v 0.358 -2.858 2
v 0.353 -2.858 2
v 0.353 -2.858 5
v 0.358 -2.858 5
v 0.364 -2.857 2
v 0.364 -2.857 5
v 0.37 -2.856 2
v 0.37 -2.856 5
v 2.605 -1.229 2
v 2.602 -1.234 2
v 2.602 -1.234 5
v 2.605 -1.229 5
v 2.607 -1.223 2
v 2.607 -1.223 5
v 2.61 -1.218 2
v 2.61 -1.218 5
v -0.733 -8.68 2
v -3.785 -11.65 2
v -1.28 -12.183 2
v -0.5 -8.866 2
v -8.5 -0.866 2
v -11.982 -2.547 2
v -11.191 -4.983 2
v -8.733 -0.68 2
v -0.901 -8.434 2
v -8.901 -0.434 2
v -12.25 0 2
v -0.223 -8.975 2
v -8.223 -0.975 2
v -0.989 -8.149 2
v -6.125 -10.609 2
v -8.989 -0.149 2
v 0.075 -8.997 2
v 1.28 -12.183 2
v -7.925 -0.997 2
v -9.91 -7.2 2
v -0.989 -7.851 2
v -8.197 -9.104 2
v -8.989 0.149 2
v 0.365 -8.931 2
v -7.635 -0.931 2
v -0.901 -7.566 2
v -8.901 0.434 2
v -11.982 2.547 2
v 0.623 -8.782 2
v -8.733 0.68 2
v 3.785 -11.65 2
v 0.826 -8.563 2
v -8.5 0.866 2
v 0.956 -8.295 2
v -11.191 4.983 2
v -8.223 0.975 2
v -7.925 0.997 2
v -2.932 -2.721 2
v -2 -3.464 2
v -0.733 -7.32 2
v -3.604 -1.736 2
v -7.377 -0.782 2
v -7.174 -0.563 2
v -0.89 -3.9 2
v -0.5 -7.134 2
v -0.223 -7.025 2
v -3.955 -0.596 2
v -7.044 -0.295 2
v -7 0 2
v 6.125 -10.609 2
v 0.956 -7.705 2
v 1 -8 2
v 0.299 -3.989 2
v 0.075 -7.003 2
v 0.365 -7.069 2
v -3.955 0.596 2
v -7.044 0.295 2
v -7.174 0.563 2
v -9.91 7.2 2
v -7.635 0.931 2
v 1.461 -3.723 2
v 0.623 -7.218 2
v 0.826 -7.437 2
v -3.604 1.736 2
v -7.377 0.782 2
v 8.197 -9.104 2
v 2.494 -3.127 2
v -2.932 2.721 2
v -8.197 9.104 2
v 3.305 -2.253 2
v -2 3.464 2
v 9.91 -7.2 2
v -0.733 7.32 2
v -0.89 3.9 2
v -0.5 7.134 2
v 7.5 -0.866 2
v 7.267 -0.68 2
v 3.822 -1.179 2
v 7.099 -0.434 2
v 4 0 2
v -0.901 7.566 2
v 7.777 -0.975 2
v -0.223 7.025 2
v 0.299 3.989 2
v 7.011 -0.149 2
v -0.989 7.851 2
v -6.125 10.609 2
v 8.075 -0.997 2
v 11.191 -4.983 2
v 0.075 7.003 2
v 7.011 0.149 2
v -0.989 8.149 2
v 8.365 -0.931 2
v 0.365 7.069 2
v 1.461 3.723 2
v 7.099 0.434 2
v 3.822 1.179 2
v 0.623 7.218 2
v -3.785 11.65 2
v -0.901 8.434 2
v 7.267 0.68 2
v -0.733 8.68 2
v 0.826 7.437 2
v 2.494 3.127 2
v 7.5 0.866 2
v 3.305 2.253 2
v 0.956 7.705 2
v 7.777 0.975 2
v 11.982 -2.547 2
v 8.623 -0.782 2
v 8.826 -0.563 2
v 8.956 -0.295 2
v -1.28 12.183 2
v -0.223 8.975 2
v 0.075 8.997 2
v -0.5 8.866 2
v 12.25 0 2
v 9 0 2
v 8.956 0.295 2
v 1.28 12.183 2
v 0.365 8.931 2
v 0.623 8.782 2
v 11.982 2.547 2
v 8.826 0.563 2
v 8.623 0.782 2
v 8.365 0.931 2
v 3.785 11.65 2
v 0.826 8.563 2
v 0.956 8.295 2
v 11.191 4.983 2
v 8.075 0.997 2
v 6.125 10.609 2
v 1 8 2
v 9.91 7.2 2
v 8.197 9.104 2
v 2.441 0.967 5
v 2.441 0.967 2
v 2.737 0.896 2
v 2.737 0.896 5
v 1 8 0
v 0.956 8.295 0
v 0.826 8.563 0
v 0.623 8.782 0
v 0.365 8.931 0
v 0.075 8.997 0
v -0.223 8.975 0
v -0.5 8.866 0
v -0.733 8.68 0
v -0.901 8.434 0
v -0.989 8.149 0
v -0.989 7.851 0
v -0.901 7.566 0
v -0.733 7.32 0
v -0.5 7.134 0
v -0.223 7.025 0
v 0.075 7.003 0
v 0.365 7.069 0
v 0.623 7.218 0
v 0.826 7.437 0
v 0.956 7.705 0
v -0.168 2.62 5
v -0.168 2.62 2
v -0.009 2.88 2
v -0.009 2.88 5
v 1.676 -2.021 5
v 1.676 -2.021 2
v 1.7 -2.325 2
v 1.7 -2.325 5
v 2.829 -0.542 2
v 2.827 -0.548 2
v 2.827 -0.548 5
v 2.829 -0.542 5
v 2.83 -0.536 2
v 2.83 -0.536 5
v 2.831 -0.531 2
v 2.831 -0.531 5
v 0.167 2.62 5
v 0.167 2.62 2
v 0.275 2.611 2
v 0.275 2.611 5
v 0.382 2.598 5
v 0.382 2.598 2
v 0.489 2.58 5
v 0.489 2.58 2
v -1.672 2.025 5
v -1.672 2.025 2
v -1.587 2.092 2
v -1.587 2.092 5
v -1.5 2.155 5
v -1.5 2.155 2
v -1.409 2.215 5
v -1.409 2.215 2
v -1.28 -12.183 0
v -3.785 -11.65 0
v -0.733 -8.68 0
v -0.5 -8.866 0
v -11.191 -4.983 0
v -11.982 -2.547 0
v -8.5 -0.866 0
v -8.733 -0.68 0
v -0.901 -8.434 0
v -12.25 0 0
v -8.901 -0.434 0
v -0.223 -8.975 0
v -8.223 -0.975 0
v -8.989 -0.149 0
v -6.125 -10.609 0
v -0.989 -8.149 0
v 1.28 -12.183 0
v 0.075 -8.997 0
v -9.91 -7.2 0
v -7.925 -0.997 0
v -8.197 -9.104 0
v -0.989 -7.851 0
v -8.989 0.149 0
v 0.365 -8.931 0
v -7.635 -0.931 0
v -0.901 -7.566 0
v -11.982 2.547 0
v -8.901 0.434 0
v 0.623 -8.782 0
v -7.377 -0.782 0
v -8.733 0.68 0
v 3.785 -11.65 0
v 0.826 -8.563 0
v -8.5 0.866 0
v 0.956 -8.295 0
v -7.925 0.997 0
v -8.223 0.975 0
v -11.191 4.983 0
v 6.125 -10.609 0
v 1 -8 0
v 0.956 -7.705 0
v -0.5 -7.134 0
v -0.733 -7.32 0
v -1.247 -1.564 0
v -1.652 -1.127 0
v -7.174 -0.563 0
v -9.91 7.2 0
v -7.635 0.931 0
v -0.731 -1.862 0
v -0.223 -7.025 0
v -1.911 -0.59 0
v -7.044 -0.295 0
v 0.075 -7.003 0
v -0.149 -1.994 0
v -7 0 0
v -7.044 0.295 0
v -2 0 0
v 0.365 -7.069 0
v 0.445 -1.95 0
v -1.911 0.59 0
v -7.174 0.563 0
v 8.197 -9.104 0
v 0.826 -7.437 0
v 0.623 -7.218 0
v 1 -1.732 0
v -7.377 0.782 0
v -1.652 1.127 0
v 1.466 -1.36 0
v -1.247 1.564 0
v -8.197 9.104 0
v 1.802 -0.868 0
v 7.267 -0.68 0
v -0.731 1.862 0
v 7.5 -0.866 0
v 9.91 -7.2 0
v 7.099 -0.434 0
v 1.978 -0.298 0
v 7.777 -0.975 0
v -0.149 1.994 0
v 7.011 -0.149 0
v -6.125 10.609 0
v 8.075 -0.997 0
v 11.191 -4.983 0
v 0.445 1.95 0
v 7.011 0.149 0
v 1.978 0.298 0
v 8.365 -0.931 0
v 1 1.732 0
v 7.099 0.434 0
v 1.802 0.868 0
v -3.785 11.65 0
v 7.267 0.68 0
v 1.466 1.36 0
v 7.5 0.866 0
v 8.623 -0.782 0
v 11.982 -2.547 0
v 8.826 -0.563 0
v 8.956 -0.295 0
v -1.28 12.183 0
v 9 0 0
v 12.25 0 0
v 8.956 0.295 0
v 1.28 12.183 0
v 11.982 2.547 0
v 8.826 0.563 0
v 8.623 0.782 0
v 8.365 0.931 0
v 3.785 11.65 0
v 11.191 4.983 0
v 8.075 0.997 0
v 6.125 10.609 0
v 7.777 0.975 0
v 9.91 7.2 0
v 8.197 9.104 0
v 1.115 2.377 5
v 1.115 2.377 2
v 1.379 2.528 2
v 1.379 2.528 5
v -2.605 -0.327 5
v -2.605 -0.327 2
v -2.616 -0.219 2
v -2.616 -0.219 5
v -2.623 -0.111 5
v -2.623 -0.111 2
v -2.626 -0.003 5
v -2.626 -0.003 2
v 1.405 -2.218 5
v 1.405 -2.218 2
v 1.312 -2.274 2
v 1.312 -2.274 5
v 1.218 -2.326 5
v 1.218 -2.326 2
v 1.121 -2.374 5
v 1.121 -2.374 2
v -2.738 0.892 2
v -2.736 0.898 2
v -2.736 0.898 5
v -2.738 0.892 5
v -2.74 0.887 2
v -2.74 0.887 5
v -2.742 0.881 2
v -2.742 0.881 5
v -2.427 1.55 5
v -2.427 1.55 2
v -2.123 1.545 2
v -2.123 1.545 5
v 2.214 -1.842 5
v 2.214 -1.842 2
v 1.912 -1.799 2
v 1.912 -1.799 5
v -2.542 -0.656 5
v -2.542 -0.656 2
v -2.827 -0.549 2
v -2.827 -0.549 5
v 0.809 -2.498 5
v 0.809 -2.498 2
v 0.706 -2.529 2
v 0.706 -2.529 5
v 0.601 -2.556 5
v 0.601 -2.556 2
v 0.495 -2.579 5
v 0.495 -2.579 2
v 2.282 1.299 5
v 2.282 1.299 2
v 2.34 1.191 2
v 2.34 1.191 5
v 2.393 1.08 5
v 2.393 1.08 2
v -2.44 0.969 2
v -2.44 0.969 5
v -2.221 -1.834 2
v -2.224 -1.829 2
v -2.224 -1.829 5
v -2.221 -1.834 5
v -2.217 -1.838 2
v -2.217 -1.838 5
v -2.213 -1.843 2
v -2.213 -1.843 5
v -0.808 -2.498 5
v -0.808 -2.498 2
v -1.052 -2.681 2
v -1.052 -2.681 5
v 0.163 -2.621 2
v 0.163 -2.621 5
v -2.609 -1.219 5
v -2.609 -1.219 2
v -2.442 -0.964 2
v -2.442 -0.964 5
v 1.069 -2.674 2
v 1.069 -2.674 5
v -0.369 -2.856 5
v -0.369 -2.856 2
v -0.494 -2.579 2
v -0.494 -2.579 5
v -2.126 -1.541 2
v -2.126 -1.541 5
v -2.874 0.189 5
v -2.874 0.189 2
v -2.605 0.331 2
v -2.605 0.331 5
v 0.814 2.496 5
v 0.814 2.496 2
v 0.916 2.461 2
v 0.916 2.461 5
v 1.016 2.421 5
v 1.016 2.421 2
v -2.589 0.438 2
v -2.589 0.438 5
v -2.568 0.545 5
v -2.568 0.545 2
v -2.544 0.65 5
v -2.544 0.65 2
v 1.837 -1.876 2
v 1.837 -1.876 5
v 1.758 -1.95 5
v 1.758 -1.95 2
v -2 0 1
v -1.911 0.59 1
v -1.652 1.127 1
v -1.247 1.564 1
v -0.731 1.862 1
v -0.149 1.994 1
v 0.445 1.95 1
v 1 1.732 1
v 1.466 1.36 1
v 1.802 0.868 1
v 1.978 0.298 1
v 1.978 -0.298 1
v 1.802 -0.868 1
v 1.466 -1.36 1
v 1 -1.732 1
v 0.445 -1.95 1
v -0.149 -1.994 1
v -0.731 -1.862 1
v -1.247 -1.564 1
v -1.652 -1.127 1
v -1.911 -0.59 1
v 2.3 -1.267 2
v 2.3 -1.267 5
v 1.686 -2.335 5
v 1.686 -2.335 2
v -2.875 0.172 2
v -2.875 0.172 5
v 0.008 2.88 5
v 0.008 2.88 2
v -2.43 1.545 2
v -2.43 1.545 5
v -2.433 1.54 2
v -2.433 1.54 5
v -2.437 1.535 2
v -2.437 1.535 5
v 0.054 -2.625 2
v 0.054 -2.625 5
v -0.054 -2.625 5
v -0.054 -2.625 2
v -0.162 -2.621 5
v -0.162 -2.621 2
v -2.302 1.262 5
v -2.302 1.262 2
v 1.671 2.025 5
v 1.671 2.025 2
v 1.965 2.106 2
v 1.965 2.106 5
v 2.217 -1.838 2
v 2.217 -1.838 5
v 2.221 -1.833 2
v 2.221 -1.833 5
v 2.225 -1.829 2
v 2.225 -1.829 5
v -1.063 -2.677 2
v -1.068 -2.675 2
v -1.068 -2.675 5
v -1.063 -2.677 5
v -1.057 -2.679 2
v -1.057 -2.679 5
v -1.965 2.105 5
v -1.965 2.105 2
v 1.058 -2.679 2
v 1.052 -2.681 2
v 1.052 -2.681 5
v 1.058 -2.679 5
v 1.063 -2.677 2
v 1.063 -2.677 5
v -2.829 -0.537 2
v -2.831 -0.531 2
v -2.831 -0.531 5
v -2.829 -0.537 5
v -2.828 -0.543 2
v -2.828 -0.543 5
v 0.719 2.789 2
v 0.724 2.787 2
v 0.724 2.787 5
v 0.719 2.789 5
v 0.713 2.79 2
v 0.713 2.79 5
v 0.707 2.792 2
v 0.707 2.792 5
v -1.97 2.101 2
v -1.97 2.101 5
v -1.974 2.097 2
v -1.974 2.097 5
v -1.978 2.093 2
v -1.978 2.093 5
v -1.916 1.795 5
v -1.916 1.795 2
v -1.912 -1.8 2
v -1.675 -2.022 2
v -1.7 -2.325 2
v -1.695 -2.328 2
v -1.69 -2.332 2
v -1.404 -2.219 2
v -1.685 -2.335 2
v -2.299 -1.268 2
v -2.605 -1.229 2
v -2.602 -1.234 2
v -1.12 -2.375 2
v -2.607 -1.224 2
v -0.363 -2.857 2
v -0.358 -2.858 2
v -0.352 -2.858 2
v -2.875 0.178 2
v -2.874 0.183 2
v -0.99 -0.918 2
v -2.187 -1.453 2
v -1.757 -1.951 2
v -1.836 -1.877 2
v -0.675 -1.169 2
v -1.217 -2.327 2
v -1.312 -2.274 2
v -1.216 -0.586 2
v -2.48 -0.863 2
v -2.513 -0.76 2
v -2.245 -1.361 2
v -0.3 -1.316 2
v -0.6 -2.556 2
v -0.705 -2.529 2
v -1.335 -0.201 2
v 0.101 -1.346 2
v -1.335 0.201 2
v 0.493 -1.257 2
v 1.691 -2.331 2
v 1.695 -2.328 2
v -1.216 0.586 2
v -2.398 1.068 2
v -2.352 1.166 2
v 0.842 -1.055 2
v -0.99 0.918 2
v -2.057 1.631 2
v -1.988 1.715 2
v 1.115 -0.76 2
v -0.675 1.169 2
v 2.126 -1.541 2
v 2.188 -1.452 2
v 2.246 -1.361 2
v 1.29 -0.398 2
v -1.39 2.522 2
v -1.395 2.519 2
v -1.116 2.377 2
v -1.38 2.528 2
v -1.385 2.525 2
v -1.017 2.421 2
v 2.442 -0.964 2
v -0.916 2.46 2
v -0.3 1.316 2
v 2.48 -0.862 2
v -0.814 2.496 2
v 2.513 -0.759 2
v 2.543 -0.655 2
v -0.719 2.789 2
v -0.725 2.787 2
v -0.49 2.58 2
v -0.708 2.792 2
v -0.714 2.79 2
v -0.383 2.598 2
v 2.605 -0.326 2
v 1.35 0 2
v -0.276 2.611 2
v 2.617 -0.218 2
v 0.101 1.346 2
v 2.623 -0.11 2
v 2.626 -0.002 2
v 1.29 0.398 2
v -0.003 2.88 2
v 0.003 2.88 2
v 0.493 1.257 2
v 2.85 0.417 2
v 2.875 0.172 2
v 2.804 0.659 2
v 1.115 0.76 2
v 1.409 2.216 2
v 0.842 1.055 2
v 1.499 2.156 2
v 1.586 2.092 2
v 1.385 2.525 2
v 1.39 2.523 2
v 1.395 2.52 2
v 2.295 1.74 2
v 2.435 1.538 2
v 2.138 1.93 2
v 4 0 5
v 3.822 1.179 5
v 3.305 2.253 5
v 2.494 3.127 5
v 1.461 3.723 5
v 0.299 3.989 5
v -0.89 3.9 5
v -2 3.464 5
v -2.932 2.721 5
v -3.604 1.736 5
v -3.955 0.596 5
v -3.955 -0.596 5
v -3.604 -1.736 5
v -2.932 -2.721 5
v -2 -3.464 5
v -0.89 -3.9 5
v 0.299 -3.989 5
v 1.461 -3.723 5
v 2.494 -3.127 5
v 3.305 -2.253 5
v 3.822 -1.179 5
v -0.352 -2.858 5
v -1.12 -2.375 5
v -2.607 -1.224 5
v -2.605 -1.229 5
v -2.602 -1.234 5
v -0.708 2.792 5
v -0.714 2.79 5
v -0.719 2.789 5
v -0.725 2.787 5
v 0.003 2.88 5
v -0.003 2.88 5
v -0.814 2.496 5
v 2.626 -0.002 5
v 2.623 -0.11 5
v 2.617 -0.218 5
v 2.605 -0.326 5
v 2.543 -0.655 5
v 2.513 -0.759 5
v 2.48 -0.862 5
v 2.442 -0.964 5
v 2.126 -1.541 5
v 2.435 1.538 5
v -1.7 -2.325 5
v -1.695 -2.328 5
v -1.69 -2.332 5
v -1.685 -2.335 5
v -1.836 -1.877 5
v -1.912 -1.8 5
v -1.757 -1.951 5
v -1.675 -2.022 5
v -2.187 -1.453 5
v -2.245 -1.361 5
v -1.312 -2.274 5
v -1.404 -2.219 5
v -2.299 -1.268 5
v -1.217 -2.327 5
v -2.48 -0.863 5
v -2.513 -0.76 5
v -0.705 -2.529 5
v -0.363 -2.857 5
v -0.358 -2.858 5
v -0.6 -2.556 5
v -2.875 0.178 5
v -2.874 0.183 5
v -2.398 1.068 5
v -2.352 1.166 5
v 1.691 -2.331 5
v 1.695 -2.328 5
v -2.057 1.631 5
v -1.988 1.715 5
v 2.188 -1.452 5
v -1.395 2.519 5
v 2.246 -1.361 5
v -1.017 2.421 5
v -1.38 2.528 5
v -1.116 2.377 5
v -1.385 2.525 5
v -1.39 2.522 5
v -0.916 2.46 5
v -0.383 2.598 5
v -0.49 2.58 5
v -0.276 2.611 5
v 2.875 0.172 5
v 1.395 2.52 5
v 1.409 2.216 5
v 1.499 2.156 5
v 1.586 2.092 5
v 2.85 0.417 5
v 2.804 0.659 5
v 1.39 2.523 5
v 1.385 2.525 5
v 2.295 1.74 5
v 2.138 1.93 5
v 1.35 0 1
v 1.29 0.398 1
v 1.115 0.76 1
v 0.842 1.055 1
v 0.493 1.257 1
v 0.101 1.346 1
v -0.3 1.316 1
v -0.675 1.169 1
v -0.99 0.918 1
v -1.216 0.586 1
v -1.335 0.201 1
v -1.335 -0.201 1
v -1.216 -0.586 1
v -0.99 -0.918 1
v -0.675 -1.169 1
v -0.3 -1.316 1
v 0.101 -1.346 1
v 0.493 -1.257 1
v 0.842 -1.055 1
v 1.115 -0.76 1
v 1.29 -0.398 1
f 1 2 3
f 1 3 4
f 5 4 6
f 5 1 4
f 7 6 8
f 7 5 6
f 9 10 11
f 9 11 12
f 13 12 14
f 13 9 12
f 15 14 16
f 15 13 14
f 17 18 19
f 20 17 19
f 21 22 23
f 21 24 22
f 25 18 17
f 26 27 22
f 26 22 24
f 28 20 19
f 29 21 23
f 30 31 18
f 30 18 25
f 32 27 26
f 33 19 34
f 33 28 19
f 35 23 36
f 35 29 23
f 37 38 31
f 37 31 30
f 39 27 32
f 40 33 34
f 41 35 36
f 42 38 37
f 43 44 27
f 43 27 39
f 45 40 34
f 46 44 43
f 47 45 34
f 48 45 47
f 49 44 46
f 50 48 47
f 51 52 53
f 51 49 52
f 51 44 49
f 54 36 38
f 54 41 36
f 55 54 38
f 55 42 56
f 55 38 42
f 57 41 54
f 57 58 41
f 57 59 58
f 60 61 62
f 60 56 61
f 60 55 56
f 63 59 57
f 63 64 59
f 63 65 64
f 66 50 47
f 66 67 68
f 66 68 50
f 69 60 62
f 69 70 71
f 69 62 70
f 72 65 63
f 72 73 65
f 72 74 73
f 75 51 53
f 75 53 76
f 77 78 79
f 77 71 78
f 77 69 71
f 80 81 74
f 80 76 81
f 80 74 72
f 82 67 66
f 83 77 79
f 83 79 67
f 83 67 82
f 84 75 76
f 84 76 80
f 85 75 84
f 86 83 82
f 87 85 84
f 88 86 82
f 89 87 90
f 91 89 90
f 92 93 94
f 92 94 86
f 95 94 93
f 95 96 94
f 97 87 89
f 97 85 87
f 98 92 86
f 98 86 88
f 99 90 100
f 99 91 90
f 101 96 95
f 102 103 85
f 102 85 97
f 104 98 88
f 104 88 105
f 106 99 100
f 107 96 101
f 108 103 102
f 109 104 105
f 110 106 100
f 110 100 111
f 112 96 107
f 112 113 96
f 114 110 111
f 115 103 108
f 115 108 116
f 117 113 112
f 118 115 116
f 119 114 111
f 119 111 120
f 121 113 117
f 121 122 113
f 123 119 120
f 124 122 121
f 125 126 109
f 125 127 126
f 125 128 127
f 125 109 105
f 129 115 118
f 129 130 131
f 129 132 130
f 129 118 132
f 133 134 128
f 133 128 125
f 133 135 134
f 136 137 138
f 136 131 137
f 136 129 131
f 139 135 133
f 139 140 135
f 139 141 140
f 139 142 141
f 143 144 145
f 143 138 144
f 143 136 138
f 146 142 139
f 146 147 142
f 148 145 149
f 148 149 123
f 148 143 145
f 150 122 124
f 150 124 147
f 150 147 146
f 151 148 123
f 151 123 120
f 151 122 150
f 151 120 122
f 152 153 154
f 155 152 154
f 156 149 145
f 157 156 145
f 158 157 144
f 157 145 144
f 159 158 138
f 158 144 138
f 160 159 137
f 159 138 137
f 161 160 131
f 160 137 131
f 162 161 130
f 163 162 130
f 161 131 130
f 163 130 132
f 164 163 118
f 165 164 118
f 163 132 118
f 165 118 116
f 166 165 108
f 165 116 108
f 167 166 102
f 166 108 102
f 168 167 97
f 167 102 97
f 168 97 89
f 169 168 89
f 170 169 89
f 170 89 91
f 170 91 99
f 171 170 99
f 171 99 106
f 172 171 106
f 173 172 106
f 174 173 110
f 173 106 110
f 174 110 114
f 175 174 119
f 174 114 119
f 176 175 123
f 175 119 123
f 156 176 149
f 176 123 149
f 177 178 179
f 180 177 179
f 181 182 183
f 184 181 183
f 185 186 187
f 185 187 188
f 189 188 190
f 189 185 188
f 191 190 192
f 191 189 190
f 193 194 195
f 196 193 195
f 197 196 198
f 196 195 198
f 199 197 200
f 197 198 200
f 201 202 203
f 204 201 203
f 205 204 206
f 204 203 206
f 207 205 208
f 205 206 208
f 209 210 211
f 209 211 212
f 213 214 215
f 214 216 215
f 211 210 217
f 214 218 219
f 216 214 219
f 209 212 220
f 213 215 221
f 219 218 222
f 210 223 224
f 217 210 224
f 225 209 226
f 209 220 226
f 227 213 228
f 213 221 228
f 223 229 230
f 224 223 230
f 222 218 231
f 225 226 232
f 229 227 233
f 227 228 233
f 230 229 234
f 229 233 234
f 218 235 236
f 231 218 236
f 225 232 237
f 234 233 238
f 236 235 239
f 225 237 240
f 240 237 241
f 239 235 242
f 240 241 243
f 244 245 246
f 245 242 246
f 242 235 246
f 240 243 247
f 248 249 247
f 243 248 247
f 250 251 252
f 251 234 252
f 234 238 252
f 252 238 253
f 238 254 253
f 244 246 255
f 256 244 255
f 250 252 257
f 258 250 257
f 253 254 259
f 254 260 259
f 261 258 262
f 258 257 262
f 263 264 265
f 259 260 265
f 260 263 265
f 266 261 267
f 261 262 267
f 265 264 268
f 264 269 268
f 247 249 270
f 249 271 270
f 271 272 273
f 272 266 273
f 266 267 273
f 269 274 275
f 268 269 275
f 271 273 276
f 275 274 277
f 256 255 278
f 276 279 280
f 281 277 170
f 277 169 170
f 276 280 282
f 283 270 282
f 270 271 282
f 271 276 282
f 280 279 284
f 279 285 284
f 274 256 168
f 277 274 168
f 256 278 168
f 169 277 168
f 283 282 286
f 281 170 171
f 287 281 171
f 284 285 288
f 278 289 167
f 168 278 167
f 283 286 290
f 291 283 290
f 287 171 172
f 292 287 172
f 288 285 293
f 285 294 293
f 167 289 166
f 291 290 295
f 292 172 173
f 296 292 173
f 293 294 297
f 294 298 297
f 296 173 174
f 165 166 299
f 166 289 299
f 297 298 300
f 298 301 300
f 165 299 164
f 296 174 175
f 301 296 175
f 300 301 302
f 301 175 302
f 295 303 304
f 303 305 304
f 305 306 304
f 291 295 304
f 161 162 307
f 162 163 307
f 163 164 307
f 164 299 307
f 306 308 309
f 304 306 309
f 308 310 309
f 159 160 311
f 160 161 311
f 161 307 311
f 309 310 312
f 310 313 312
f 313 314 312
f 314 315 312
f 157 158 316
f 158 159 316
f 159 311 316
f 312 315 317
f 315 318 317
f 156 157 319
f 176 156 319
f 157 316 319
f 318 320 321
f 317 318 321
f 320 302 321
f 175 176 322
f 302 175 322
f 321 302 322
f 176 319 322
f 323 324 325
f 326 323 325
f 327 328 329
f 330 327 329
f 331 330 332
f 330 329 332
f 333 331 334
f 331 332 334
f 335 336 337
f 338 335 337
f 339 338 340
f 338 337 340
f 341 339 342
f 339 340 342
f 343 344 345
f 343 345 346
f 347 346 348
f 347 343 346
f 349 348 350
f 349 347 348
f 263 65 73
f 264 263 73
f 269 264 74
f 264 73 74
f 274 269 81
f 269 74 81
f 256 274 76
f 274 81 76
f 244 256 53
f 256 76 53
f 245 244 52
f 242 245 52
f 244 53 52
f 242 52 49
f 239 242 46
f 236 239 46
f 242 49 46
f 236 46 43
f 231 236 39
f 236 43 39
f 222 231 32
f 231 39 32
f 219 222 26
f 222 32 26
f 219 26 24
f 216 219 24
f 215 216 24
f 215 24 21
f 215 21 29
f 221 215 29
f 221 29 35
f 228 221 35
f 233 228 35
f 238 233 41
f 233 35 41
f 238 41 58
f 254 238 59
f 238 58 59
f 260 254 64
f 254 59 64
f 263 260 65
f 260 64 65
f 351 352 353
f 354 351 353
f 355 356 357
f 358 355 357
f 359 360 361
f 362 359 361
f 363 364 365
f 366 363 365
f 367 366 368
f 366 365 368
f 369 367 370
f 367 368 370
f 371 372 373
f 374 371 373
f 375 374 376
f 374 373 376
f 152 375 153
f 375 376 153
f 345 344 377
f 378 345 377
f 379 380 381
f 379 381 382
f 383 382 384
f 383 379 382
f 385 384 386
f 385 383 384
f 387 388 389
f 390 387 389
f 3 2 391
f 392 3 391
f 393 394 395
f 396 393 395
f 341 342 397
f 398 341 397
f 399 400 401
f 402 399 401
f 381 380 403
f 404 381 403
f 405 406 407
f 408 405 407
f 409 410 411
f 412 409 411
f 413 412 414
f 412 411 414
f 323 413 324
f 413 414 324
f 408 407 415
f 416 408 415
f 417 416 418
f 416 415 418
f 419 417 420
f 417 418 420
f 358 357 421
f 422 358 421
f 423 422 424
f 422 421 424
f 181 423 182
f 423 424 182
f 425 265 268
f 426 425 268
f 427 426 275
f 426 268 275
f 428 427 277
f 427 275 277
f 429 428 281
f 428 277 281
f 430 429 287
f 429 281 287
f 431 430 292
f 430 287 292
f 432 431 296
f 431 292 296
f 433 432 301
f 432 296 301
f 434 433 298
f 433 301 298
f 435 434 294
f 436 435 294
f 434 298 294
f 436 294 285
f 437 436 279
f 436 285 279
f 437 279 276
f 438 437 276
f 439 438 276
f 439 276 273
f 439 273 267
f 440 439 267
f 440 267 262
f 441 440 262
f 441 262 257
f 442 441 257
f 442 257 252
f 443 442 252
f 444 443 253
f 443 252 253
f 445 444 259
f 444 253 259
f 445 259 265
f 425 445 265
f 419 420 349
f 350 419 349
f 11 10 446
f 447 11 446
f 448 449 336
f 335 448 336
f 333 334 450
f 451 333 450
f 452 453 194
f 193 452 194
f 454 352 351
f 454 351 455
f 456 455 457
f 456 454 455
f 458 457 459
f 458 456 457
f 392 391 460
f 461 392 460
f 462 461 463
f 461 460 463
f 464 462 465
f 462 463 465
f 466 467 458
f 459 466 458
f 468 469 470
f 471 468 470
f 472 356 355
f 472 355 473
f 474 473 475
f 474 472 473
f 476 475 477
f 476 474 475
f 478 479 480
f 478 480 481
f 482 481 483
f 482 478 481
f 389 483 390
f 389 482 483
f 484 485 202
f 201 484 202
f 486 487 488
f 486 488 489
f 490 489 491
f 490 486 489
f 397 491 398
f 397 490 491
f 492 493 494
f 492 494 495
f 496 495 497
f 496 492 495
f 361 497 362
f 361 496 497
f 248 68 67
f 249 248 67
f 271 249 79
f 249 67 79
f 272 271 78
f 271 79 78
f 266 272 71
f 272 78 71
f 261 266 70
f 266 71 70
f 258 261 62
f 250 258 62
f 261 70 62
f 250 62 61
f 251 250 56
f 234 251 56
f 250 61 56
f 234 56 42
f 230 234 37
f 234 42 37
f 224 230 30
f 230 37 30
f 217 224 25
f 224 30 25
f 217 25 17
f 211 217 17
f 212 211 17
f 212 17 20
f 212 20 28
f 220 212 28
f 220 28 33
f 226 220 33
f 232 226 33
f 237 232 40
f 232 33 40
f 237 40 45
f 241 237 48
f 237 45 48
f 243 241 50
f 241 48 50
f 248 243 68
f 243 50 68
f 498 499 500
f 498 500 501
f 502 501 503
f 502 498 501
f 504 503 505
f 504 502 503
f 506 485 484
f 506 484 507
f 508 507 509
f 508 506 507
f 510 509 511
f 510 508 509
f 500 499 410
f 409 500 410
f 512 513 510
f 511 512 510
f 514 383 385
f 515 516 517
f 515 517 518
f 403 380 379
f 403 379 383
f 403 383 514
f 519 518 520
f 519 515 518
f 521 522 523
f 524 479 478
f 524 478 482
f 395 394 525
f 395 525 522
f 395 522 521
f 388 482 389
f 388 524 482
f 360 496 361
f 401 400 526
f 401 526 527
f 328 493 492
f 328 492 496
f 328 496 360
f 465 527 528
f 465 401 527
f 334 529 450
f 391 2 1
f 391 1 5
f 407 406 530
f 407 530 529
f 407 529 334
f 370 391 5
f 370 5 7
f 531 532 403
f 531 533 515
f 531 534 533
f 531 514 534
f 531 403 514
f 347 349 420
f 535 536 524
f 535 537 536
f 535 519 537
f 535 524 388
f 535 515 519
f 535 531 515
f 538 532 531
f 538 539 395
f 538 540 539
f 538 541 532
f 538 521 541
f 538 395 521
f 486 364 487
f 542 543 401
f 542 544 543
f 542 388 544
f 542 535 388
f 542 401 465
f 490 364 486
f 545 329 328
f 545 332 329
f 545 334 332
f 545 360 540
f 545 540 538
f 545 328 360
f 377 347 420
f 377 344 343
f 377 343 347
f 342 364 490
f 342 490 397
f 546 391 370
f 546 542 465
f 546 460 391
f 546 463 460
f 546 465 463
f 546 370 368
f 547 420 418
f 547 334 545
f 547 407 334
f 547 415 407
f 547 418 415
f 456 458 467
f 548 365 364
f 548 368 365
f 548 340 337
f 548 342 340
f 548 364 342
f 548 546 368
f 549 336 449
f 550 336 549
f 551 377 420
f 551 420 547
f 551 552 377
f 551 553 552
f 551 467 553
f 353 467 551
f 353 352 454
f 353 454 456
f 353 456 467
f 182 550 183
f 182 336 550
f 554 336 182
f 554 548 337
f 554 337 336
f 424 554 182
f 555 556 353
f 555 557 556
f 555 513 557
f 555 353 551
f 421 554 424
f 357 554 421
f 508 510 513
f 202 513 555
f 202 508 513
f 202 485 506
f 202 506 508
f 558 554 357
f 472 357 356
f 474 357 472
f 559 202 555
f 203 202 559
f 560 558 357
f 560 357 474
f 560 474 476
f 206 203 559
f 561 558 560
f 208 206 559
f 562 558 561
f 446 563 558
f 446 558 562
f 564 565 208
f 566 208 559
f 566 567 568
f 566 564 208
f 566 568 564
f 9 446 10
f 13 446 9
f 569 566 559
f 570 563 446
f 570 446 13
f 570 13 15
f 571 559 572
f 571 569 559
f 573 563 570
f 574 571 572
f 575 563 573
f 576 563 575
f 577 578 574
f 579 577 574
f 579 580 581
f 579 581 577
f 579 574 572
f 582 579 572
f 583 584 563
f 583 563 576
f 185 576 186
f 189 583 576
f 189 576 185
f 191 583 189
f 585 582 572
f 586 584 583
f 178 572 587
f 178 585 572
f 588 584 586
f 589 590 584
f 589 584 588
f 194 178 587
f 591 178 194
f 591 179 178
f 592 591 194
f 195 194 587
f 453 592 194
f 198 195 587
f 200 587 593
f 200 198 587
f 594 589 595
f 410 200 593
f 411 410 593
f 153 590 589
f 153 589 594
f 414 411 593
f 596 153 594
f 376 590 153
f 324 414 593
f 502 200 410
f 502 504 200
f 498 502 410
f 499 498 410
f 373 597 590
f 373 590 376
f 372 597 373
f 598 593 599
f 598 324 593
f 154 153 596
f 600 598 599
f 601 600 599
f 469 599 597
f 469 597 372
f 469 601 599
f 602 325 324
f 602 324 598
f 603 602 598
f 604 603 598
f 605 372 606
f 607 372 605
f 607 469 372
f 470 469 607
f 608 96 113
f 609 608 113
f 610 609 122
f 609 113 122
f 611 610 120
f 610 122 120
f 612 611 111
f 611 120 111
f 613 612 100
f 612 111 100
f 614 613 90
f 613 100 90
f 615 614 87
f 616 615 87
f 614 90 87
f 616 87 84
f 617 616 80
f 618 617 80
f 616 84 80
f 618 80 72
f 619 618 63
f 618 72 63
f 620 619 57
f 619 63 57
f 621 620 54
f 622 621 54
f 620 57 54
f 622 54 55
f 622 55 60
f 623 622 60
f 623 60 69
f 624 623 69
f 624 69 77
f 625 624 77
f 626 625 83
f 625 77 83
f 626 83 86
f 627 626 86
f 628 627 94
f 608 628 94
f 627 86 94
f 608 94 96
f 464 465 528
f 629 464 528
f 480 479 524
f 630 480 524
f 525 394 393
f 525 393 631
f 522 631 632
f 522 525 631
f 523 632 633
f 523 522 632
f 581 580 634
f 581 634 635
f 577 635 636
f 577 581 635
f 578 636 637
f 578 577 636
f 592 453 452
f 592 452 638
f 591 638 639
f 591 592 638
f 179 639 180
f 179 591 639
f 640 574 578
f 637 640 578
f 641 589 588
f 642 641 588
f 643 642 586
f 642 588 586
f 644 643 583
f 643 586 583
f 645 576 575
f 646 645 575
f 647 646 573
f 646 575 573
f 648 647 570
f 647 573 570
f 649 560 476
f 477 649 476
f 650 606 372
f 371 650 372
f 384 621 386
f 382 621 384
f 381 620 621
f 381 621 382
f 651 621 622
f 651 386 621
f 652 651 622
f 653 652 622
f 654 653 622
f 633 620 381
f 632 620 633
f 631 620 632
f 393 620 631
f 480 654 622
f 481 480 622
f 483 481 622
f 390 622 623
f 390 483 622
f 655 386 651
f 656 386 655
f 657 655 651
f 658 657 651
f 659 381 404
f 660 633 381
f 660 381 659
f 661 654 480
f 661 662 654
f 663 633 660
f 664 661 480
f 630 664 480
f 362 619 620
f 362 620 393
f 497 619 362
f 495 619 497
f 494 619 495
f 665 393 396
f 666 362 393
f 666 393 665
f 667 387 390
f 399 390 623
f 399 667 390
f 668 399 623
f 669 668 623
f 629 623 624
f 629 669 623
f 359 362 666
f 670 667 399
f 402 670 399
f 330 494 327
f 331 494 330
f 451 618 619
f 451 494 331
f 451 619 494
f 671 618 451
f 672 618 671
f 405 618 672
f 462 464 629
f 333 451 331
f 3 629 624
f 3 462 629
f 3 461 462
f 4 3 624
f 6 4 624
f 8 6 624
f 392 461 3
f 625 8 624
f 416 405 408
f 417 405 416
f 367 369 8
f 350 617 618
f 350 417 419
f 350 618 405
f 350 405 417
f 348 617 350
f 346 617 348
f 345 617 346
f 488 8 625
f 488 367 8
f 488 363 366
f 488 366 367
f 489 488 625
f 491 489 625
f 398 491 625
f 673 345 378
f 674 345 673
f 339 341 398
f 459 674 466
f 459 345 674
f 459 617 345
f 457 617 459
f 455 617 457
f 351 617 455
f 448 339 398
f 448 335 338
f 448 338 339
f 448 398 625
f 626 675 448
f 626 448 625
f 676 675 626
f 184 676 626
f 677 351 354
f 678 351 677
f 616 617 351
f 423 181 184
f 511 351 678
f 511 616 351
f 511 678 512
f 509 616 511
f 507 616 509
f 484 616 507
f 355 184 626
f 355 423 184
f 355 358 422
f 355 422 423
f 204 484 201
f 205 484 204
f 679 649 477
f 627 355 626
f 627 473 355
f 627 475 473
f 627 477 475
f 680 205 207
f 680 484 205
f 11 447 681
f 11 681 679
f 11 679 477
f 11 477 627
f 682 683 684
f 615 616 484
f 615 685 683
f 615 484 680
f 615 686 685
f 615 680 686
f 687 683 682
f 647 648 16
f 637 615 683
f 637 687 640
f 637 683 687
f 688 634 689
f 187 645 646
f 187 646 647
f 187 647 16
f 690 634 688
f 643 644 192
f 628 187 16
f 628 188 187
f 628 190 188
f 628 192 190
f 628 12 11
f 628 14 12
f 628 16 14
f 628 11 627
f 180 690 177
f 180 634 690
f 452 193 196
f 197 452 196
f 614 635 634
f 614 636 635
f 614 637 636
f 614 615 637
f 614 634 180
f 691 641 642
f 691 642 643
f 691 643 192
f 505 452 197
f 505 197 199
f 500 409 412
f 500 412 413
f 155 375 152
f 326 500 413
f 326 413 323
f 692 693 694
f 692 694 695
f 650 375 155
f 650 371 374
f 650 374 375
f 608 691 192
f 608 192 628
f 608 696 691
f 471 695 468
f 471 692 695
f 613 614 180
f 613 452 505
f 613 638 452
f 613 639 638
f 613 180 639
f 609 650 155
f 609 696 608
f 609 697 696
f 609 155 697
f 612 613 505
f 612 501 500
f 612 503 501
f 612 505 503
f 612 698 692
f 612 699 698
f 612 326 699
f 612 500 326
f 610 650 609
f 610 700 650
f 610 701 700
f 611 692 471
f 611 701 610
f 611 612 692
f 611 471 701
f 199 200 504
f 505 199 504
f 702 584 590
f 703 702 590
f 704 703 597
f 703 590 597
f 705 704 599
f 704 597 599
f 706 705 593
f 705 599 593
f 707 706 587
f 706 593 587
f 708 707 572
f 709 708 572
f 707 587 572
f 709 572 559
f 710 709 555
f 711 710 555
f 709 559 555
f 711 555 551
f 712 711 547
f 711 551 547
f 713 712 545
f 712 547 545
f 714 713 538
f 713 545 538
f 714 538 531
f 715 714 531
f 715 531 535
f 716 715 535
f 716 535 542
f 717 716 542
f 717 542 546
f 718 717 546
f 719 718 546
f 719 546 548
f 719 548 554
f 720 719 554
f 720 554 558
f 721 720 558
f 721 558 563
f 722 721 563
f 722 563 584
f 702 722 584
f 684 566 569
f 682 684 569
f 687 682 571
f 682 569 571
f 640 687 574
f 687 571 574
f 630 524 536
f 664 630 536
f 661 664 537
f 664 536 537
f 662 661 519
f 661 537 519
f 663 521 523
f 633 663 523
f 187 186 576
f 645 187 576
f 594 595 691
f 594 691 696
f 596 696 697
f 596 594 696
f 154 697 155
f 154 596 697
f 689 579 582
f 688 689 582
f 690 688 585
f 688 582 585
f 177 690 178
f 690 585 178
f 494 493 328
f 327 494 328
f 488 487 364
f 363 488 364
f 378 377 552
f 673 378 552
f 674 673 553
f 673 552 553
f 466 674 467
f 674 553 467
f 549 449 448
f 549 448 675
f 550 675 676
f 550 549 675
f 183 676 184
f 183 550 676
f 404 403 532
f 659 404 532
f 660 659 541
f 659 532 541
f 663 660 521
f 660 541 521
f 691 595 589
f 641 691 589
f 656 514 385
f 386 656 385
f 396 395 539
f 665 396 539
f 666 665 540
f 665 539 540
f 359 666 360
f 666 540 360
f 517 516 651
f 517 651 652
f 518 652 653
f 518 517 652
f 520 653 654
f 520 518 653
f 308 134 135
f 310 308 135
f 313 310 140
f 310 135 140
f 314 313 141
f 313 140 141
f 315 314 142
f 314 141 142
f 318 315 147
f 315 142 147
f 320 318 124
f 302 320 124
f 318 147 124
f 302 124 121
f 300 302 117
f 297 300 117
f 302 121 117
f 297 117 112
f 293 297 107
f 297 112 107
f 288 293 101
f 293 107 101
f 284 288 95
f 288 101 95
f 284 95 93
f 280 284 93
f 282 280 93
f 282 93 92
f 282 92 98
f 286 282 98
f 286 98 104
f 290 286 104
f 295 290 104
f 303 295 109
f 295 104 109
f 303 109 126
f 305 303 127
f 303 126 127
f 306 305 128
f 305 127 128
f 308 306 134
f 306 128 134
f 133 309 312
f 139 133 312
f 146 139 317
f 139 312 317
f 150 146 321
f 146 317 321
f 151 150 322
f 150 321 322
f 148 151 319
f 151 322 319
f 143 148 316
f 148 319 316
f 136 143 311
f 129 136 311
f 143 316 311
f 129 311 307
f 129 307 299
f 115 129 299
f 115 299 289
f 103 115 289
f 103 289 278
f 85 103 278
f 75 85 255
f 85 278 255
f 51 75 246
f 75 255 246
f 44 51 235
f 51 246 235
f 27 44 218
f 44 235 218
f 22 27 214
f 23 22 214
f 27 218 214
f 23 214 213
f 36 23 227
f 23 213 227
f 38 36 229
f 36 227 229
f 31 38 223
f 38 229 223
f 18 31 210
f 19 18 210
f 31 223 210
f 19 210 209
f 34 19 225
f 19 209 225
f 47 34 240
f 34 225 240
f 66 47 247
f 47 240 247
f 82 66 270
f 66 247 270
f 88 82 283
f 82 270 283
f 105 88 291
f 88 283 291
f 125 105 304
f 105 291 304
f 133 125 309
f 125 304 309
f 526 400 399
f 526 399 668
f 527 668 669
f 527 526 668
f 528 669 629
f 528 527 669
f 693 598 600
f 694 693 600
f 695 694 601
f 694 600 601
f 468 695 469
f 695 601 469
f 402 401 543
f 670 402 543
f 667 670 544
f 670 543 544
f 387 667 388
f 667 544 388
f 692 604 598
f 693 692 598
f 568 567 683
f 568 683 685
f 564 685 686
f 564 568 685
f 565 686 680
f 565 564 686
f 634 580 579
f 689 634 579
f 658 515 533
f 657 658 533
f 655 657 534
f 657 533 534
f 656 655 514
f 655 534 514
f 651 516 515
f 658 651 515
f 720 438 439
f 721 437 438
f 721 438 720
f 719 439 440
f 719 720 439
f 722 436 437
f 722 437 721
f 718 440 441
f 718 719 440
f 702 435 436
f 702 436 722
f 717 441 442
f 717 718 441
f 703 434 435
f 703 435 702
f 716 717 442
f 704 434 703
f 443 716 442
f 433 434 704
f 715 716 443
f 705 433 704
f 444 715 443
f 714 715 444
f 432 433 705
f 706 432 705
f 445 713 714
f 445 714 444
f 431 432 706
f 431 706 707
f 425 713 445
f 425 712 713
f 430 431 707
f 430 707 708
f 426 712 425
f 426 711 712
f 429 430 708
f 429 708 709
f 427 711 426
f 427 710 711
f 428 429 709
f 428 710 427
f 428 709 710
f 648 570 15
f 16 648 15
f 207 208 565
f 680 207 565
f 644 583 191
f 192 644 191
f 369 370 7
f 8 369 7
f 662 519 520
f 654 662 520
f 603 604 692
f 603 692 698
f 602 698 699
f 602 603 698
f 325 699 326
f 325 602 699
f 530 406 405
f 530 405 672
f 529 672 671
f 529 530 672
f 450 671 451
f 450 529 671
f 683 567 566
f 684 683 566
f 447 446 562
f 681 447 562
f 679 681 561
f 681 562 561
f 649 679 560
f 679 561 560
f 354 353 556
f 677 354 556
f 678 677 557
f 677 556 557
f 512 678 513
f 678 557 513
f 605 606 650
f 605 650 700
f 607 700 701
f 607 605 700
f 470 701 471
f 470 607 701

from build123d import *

# Parameters (mm, degrees)
SKETCH1_R           = 12.25
BOSS_EXTRUDE1_DEPTH = 2
SKETCH2_R           = 1
CUT_EXTRUDE1_DEPTH  = 2
SKETCH3_R           = 1.35
CUT_EXTRUDE2_DEPTH  = 4
SKETCH4_R           = 4
SKETCH4_R_2         = 2.88
BOSS_EXTRUDE2_DEPTH = 3
SKETCH6_R           = 2
CUT_EXTRUDE3_DEPTH  = 1
BOSS_EXTRUDE4_START = -3
BOSS_EXTRUDE4_DEPTH = 3


with BuildPart() as part:
    # Sketch1 → Boss-Extrude1 (new body)
    with BuildSketch(Plane.XY):
        Circle(SKETCH1_R)
    extrude(amount=BOSS_EXTRUDE1_DEPTH)

    # Sketch2 → Cut-Extrude1 (cut)
    with BuildSketch(Plane.XY.offset(2)):
        with Locations((-8, 0)):
            Circle(SKETCH2_R)
        with Locations((0, 8)):
            Circle(SKETCH2_R)
        with Locations((8, 0)):
            Circle(SKETCH2_R)
        with Locations((0, -8)):
            Circle(SKETCH2_R)
    extrude(amount=-CUT_EXTRUDE1_DEPTH, mode=Mode.SUBTRACT)

    # Sketch3 → Cut-Extrude2 (cut)
    with BuildSketch(Plane.XY.offset(2)):
        Circle(SKETCH3_R)
    extrude(amount=-CUT_EXTRUDE2_DEPTH, mode=Mode.SUBTRACT)

    # Sketch4 → Boss-Extrude2 (add)
    with BuildSketch(Plane.XY.offset(2)):
        Circle(SKETCH4_R)
        Circle(SKETCH4_R_2, mode=Mode.SUBTRACT)
    extrude(amount=BOSS_EXTRUDE2_DEPTH)

    # Sketch6 → Cut-Extrude3 (cut)
    with BuildSketch(Plane(origin=(0, 0, 0), x_dir=(-1, 0, 0), z_dir=(0, 0, -1))):
        Circle(SKETCH6_R)
    extrude(amount=-CUT_EXTRUDE3_DEPTH, mode=Mode.SUBTRACT)

    # Sketch5 → Boss-Extrude4 (add)
    with BuildSketch(Plane.XY.offset(5).offset(BOSS_EXTRUDE4_START)):
        with BuildLine():
            Line((-0.161756527, -2.620613729), (-0.351910166, -2.85841901))
            ThreePointArc((-0.351910166, -2.85841901), (0.000368858, -2.879999976), (0.352642342, -2.858328774))
            Line((0.352642342, -2.858328774), (0.162522941, -2.62056631))
            ThreePointArc((0.162522941, -2.62056631), (0.00038394, -2.625601139), (-0.161756527, -2.620613729))
        make_face()
        with BuildLine():
            ThreePointArc((-1.051714162, -2.681100021), (-0.715869599, -2.789611212), (-0.369274025, -2.856227703))
            Line((-0.369274025, -2.856227703), (-0.494291356, -2.578654212))
            ThreePointArc((-0.494291356, -2.578654212), (-0.652588574, -2.543208533), (-0.808394781, -2.498055117))
            Line((-0.808394781, -2.498055117), (-1.051714162, -2.681100021))
        make_face()
        with BuildLine():
            Line((0.495045485, -2.578509542), (0.37000564, -2.85613302))
            ThreePointArc((0.37000564, -2.85613302), (0.716584139, -2.78942775), (1.052400895, -2.680830535))
            Line((1.052400895, -2.680830535), (0.809125323, -2.497818589))
            ThreePointArc((0.809125323, -2.497818589), (0.653332329, -2.54301757), (0.495045485, -2.578509542))
        make_face()
        with BuildLine():
            ThreePointArc((-1.685435089, -2.335317657), (-1.387127337, -2.523940917), (-1.067987548, -2.674659342))
            Line((-1.067987548, -2.674659342), (-1.12004751, -2.374715787))
            ThreePointArc((-1.12004751, -2.374715787), (-1.264556547, -2.301016782), (-1.404238617, -2.218534516))
            Line((-1.404238617, -2.218534516), (-1.685435089, -2.335317657))
        make_face()
        with BuildLine():
            Line((1.120741967, -2.374388118), (1.068672631, -2.674385688))
            ThreePointArc((1.068672631, -2.674385688), (1.387773803, -2.523585519), (1.686033229, -2.334885854))
            Line((1.686033229, -2.334885854), (1.404887387, -2.218123739))
            ThreePointArc((1.404887387, -2.218123739), (1.265229445, -2.300646853), (1.120741967, -2.374388118))
        make_face()
        with BuildLine():
            ThreePointArc((-2.213253931, -1.842798696), (-1.971226763, -2.09968213), (-1.699595485, -2.325032298))
            Line((-1.699595485, -2.325032298), (-1.675426958, -2.021565235))
            ThreePointArc((-1.675426958, -2.021565235), (-1.797067781, -1.914243684), (-1.911848977, -1.799615231))
            Line((-1.911848977, -1.799615231), (-2.213253931, -1.842798696))
        make_face()
        with BuildLine():
            Line((1.676018111, -2.021075155), (1.70019099, -2.324596868))
            ThreePointArc((1.70019099, -2.324596868), (1.971764535, -2.099177129), (2.213725894, -1.842231708))
            Line((2.213725894, -1.842231708), (1.912375208, -1.799056017))
            ThreePointArc((1.912375208, -1.799056017), (1.797627541, -1.913718034), (1.676018111, -2.021075155))
        make_face()
        with BuildLine():
            ThreePointArc((-2.602005889, -1.234489916), (-2.431466761, -1.543492594), (-2.224411588, -1.829314923))
            Line((-2.224411588, -1.829314923), (-2.12553317, -1.541392304))
            ThreePointArc((-2.12553317, -1.541392304), (-2.216662638, -1.407191614), (-2.299330835, -1.267619503))
            Line((-2.299330835, -1.267619503), (-2.602005889, -1.234489916))
        make_face()
        with BuildLine():
            Line((2.125983872, -1.540770608), (2.224880096, -1.828745077))
            ThreePointArc((2.224880096, -1.828745077), (2.43186205, -1.54286972), (2.60232202, -1.233823368))
            Line((2.60232202, -1.233823368), (2.299701462, -1.26694699))
            ThreePointArc((2.299701462, -1.26694699), (2.217074088, -1.406543272), (2.125983872, -1.540770608))
        make_face()
        with BuildLine():
            ThreePointArc((-2.827264247, -0.548613595), (-2.738928761, -0.890319741), (-2.609459729, -1.218654964))
            Line((-2.609459729, -1.218654964), (-2.442084315, -0.964368026))
            ThreePointArc((-2.442084315, -0.964368026), (-2.496976429, -0.811720521), (-2.542337279, -0.655974579))
            Line((-2.542337279, -0.655974579), (-2.827264247, -0.548613595))
        make_face()
        with BuildLine():
            Line((2.442366248, -0.963653777), (2.609771804, -1.217986508))
            ThreePointArc((2.609771804, -1.217986508), (2.739156728, -0.889618132), (2.827404683, -0.547889369))
            Line((2.827404683, -0.547889369), (2.542529016, -0.655231023))
            ThreePointArc((2.542529016, -0.655231023), (2.497213717, -0.810990224), (2.442366248, -0.963653777))
        make_face()
        with BuildLine():
            ThreePointArc((-2.874875195, 0.171734137), (-2.874293794, -0.181204825), (-2.830545919, -0.531422432))
            Line((-2.830545919, -0.531422432), (-2.605190321, -0.326748959))
            ThreePointArc((-2.605190321, -0.326748959), (-2.620396008, -0.165246042), (-2.625599323, -0.00311236))
            Line((-2.625599323, -0.00311236), (-2.874875195, 0.171734137))
        make_face()
        with BuildLine():
            Line((2.60528577, -0.325987035), (2.830681951, -0.530697366))
            ThreePointArc((2.830681951, -0.530697366), (2.874340115, -0.180468565), (2.874831111, 0.172470535))
            Line((2.874831111, 0.172470535), (2.625600121, -0.002344481))
            ThreePointArc((2.625600121, -0.002344481), (2.620444223, -0.164479678), (2.60528577, -0.325987035))
        make_face()
        with BuildLine():
            ThreePointArc((-2.741847161, 0.881291181), (-2.829056376, 0.539295857), (-2.873778498, 0.189201326))
            Line((-2.873778498, 0.189201326), (-2.604602638, 0.331400948))
            ThreePointArc((-2.604602638, 0.331400948), (-2.579166468, 0.491611454), (-2.543885305, 0.64994542))
            Line((-2.543885305, 0.64994542), (-2.741847161, 0.881291181))
        make_face()
        with BuildLine():
            ThreePointArc((-2.436538786, 1.535473459), (-2.606058942, 1.225910597), (-2.736441006, 0.897936869))
            Line((-2.736441006, 0.897936869), (-2.440358193, 0.968727714))
            ThreePointArc((-2.440358193, 0.968727714), (-2.375878414, 1.117579194), (-2.302329617, 1.262164738))
            Line((-2.302329617, 1.262164738), (-2.436538786, 1.535473459))
        make_face()
        with BuildLine():
            ThreePointArc((-1.978133718, 2.093176293), (-2.21931324, 1.835496865), (-2.427162861, 1.550251736))
            Line((-2.427162861, 1.550251736), (-2.122777067, 1.545185755))
            ThreePointArc((-2.122777067, 1.545185755), (-2.023305181, 1.673325323), (-1.916110092, 1.795077605))
            Line((-1.916110092, 1.795077605), (-1.978133718, 2.093176293))
        make_face()
        with BuildLine():
            Line((2.440995413, 0.967120926), (2.73696806, 0.89632909))
            ThreePointArc((2.73696806, 0.89632909), (2.605878342, 1.226294446), (2.435183429, 1.537622082))
            Line((2.435183429, 1.537622082), (2.282024688, 1.298516389))
            ThreePointArc((2.282024688, 1.298516389), (2.367316087, 1.135603819), (2.440995413, 0.967120926))
        make_face()
        with BuildLine():
            ThreePointArc((-1.395435234, 2.519357162), (-1.693119925, 2.329752115), (-1.965377147, 2.105158585))
            Line((-1.965377147, 2.105158585), (-1.671814051, 2.024554092))
            ThreePointArc((-1.671814051, 2.024554092), (-1.543600242, 2.123930268), (-1.409494323, 2.215199143))
            Line((-1.409494323, 2.215199143), (-1.395435234, 2.519357162))
        make_face()
        with BuildLine():
            ThreePointArc((-0.725056422, 2.787237554), (-1.060541659, 2.677620472), (-1.380099559, 2.527790578))
            Line((-1.380099559, 2.527790578), (-1.115804809, 2.37671225))
            ThreePointArc((-1.115804809, 2.37671225), (-0.966905223, 2.441080863), (-0.814314842, 2.496131573))
            Line((-0.814314842, 2.496131573), (-0.725056422, 2.787237554))
        make_face()
        with BuildLine():
            ThreePointArc((-0.009119648, 2.879985561), (-0.361325659, 2.857244086), (-0.70810524, 2.791592192))
            Line((-0.70810524, 2.791592192), (-0.489685448, 2.579532836))
            ThreePointArc((-0.489685448, 2.579532836), (-0.329455993, 2.60484937), (-0.167968964, 2.620222876))
            Line((-0.167968964, 2.620222876), (-0.009119648, 2.879985561))
        make_face()
        with BuildLine():
            Line((1.671221881, 2.025042942), (1.964837844, 2.10566195))
            ThreePointArc((1.964837844, 2.10566195), (1.6925231, 2.330185734), (1.394789851, 2.519714522))
            Line((1.394789851, 2.519714522), (1.408846409, 2.215611267))
            ThreePointArc((1.408846409, 2.215611267), (1.542979014, 2.124381616), (1.671221881, 2.025042942))
        make_face()
        with BuildLine():
            ThreePointArc((0.707390147, 2.791773483), (0.36059376, 2.857336547), (0.008381935, 2.879987803))
            Line((0.008381935, 2.879987803), (0.167202651, 2.620271888))
            ThreePointArc((0.167202651, 2.620271888), (0.328694169, 2.604945611), (0.488931021, 2.579675939))
            Line((0.488931021, 2.579675939), (0.707390147, 2.791773483))
        make_face()
        with BuildLine():
            Line((1.115109672, 2.377038475), (1.379452017, 2.52814401))
            ThreePointArc((1.379452017, 2.52814401), (1.059855747, 2.677892043), (0.724342443, 2.787423187))
            Line((0.724342443, 2.787423187), (0.813584792, 2.49636962))
            ThreePointArc((0.813584792, 2.49636962), (0.966191267, 2.441363538), (1.115109672, 2.377038475))
        make_face()
    extrude(amount=BOSS_EXTRUDE4_DEPTH)


solid = part.part
